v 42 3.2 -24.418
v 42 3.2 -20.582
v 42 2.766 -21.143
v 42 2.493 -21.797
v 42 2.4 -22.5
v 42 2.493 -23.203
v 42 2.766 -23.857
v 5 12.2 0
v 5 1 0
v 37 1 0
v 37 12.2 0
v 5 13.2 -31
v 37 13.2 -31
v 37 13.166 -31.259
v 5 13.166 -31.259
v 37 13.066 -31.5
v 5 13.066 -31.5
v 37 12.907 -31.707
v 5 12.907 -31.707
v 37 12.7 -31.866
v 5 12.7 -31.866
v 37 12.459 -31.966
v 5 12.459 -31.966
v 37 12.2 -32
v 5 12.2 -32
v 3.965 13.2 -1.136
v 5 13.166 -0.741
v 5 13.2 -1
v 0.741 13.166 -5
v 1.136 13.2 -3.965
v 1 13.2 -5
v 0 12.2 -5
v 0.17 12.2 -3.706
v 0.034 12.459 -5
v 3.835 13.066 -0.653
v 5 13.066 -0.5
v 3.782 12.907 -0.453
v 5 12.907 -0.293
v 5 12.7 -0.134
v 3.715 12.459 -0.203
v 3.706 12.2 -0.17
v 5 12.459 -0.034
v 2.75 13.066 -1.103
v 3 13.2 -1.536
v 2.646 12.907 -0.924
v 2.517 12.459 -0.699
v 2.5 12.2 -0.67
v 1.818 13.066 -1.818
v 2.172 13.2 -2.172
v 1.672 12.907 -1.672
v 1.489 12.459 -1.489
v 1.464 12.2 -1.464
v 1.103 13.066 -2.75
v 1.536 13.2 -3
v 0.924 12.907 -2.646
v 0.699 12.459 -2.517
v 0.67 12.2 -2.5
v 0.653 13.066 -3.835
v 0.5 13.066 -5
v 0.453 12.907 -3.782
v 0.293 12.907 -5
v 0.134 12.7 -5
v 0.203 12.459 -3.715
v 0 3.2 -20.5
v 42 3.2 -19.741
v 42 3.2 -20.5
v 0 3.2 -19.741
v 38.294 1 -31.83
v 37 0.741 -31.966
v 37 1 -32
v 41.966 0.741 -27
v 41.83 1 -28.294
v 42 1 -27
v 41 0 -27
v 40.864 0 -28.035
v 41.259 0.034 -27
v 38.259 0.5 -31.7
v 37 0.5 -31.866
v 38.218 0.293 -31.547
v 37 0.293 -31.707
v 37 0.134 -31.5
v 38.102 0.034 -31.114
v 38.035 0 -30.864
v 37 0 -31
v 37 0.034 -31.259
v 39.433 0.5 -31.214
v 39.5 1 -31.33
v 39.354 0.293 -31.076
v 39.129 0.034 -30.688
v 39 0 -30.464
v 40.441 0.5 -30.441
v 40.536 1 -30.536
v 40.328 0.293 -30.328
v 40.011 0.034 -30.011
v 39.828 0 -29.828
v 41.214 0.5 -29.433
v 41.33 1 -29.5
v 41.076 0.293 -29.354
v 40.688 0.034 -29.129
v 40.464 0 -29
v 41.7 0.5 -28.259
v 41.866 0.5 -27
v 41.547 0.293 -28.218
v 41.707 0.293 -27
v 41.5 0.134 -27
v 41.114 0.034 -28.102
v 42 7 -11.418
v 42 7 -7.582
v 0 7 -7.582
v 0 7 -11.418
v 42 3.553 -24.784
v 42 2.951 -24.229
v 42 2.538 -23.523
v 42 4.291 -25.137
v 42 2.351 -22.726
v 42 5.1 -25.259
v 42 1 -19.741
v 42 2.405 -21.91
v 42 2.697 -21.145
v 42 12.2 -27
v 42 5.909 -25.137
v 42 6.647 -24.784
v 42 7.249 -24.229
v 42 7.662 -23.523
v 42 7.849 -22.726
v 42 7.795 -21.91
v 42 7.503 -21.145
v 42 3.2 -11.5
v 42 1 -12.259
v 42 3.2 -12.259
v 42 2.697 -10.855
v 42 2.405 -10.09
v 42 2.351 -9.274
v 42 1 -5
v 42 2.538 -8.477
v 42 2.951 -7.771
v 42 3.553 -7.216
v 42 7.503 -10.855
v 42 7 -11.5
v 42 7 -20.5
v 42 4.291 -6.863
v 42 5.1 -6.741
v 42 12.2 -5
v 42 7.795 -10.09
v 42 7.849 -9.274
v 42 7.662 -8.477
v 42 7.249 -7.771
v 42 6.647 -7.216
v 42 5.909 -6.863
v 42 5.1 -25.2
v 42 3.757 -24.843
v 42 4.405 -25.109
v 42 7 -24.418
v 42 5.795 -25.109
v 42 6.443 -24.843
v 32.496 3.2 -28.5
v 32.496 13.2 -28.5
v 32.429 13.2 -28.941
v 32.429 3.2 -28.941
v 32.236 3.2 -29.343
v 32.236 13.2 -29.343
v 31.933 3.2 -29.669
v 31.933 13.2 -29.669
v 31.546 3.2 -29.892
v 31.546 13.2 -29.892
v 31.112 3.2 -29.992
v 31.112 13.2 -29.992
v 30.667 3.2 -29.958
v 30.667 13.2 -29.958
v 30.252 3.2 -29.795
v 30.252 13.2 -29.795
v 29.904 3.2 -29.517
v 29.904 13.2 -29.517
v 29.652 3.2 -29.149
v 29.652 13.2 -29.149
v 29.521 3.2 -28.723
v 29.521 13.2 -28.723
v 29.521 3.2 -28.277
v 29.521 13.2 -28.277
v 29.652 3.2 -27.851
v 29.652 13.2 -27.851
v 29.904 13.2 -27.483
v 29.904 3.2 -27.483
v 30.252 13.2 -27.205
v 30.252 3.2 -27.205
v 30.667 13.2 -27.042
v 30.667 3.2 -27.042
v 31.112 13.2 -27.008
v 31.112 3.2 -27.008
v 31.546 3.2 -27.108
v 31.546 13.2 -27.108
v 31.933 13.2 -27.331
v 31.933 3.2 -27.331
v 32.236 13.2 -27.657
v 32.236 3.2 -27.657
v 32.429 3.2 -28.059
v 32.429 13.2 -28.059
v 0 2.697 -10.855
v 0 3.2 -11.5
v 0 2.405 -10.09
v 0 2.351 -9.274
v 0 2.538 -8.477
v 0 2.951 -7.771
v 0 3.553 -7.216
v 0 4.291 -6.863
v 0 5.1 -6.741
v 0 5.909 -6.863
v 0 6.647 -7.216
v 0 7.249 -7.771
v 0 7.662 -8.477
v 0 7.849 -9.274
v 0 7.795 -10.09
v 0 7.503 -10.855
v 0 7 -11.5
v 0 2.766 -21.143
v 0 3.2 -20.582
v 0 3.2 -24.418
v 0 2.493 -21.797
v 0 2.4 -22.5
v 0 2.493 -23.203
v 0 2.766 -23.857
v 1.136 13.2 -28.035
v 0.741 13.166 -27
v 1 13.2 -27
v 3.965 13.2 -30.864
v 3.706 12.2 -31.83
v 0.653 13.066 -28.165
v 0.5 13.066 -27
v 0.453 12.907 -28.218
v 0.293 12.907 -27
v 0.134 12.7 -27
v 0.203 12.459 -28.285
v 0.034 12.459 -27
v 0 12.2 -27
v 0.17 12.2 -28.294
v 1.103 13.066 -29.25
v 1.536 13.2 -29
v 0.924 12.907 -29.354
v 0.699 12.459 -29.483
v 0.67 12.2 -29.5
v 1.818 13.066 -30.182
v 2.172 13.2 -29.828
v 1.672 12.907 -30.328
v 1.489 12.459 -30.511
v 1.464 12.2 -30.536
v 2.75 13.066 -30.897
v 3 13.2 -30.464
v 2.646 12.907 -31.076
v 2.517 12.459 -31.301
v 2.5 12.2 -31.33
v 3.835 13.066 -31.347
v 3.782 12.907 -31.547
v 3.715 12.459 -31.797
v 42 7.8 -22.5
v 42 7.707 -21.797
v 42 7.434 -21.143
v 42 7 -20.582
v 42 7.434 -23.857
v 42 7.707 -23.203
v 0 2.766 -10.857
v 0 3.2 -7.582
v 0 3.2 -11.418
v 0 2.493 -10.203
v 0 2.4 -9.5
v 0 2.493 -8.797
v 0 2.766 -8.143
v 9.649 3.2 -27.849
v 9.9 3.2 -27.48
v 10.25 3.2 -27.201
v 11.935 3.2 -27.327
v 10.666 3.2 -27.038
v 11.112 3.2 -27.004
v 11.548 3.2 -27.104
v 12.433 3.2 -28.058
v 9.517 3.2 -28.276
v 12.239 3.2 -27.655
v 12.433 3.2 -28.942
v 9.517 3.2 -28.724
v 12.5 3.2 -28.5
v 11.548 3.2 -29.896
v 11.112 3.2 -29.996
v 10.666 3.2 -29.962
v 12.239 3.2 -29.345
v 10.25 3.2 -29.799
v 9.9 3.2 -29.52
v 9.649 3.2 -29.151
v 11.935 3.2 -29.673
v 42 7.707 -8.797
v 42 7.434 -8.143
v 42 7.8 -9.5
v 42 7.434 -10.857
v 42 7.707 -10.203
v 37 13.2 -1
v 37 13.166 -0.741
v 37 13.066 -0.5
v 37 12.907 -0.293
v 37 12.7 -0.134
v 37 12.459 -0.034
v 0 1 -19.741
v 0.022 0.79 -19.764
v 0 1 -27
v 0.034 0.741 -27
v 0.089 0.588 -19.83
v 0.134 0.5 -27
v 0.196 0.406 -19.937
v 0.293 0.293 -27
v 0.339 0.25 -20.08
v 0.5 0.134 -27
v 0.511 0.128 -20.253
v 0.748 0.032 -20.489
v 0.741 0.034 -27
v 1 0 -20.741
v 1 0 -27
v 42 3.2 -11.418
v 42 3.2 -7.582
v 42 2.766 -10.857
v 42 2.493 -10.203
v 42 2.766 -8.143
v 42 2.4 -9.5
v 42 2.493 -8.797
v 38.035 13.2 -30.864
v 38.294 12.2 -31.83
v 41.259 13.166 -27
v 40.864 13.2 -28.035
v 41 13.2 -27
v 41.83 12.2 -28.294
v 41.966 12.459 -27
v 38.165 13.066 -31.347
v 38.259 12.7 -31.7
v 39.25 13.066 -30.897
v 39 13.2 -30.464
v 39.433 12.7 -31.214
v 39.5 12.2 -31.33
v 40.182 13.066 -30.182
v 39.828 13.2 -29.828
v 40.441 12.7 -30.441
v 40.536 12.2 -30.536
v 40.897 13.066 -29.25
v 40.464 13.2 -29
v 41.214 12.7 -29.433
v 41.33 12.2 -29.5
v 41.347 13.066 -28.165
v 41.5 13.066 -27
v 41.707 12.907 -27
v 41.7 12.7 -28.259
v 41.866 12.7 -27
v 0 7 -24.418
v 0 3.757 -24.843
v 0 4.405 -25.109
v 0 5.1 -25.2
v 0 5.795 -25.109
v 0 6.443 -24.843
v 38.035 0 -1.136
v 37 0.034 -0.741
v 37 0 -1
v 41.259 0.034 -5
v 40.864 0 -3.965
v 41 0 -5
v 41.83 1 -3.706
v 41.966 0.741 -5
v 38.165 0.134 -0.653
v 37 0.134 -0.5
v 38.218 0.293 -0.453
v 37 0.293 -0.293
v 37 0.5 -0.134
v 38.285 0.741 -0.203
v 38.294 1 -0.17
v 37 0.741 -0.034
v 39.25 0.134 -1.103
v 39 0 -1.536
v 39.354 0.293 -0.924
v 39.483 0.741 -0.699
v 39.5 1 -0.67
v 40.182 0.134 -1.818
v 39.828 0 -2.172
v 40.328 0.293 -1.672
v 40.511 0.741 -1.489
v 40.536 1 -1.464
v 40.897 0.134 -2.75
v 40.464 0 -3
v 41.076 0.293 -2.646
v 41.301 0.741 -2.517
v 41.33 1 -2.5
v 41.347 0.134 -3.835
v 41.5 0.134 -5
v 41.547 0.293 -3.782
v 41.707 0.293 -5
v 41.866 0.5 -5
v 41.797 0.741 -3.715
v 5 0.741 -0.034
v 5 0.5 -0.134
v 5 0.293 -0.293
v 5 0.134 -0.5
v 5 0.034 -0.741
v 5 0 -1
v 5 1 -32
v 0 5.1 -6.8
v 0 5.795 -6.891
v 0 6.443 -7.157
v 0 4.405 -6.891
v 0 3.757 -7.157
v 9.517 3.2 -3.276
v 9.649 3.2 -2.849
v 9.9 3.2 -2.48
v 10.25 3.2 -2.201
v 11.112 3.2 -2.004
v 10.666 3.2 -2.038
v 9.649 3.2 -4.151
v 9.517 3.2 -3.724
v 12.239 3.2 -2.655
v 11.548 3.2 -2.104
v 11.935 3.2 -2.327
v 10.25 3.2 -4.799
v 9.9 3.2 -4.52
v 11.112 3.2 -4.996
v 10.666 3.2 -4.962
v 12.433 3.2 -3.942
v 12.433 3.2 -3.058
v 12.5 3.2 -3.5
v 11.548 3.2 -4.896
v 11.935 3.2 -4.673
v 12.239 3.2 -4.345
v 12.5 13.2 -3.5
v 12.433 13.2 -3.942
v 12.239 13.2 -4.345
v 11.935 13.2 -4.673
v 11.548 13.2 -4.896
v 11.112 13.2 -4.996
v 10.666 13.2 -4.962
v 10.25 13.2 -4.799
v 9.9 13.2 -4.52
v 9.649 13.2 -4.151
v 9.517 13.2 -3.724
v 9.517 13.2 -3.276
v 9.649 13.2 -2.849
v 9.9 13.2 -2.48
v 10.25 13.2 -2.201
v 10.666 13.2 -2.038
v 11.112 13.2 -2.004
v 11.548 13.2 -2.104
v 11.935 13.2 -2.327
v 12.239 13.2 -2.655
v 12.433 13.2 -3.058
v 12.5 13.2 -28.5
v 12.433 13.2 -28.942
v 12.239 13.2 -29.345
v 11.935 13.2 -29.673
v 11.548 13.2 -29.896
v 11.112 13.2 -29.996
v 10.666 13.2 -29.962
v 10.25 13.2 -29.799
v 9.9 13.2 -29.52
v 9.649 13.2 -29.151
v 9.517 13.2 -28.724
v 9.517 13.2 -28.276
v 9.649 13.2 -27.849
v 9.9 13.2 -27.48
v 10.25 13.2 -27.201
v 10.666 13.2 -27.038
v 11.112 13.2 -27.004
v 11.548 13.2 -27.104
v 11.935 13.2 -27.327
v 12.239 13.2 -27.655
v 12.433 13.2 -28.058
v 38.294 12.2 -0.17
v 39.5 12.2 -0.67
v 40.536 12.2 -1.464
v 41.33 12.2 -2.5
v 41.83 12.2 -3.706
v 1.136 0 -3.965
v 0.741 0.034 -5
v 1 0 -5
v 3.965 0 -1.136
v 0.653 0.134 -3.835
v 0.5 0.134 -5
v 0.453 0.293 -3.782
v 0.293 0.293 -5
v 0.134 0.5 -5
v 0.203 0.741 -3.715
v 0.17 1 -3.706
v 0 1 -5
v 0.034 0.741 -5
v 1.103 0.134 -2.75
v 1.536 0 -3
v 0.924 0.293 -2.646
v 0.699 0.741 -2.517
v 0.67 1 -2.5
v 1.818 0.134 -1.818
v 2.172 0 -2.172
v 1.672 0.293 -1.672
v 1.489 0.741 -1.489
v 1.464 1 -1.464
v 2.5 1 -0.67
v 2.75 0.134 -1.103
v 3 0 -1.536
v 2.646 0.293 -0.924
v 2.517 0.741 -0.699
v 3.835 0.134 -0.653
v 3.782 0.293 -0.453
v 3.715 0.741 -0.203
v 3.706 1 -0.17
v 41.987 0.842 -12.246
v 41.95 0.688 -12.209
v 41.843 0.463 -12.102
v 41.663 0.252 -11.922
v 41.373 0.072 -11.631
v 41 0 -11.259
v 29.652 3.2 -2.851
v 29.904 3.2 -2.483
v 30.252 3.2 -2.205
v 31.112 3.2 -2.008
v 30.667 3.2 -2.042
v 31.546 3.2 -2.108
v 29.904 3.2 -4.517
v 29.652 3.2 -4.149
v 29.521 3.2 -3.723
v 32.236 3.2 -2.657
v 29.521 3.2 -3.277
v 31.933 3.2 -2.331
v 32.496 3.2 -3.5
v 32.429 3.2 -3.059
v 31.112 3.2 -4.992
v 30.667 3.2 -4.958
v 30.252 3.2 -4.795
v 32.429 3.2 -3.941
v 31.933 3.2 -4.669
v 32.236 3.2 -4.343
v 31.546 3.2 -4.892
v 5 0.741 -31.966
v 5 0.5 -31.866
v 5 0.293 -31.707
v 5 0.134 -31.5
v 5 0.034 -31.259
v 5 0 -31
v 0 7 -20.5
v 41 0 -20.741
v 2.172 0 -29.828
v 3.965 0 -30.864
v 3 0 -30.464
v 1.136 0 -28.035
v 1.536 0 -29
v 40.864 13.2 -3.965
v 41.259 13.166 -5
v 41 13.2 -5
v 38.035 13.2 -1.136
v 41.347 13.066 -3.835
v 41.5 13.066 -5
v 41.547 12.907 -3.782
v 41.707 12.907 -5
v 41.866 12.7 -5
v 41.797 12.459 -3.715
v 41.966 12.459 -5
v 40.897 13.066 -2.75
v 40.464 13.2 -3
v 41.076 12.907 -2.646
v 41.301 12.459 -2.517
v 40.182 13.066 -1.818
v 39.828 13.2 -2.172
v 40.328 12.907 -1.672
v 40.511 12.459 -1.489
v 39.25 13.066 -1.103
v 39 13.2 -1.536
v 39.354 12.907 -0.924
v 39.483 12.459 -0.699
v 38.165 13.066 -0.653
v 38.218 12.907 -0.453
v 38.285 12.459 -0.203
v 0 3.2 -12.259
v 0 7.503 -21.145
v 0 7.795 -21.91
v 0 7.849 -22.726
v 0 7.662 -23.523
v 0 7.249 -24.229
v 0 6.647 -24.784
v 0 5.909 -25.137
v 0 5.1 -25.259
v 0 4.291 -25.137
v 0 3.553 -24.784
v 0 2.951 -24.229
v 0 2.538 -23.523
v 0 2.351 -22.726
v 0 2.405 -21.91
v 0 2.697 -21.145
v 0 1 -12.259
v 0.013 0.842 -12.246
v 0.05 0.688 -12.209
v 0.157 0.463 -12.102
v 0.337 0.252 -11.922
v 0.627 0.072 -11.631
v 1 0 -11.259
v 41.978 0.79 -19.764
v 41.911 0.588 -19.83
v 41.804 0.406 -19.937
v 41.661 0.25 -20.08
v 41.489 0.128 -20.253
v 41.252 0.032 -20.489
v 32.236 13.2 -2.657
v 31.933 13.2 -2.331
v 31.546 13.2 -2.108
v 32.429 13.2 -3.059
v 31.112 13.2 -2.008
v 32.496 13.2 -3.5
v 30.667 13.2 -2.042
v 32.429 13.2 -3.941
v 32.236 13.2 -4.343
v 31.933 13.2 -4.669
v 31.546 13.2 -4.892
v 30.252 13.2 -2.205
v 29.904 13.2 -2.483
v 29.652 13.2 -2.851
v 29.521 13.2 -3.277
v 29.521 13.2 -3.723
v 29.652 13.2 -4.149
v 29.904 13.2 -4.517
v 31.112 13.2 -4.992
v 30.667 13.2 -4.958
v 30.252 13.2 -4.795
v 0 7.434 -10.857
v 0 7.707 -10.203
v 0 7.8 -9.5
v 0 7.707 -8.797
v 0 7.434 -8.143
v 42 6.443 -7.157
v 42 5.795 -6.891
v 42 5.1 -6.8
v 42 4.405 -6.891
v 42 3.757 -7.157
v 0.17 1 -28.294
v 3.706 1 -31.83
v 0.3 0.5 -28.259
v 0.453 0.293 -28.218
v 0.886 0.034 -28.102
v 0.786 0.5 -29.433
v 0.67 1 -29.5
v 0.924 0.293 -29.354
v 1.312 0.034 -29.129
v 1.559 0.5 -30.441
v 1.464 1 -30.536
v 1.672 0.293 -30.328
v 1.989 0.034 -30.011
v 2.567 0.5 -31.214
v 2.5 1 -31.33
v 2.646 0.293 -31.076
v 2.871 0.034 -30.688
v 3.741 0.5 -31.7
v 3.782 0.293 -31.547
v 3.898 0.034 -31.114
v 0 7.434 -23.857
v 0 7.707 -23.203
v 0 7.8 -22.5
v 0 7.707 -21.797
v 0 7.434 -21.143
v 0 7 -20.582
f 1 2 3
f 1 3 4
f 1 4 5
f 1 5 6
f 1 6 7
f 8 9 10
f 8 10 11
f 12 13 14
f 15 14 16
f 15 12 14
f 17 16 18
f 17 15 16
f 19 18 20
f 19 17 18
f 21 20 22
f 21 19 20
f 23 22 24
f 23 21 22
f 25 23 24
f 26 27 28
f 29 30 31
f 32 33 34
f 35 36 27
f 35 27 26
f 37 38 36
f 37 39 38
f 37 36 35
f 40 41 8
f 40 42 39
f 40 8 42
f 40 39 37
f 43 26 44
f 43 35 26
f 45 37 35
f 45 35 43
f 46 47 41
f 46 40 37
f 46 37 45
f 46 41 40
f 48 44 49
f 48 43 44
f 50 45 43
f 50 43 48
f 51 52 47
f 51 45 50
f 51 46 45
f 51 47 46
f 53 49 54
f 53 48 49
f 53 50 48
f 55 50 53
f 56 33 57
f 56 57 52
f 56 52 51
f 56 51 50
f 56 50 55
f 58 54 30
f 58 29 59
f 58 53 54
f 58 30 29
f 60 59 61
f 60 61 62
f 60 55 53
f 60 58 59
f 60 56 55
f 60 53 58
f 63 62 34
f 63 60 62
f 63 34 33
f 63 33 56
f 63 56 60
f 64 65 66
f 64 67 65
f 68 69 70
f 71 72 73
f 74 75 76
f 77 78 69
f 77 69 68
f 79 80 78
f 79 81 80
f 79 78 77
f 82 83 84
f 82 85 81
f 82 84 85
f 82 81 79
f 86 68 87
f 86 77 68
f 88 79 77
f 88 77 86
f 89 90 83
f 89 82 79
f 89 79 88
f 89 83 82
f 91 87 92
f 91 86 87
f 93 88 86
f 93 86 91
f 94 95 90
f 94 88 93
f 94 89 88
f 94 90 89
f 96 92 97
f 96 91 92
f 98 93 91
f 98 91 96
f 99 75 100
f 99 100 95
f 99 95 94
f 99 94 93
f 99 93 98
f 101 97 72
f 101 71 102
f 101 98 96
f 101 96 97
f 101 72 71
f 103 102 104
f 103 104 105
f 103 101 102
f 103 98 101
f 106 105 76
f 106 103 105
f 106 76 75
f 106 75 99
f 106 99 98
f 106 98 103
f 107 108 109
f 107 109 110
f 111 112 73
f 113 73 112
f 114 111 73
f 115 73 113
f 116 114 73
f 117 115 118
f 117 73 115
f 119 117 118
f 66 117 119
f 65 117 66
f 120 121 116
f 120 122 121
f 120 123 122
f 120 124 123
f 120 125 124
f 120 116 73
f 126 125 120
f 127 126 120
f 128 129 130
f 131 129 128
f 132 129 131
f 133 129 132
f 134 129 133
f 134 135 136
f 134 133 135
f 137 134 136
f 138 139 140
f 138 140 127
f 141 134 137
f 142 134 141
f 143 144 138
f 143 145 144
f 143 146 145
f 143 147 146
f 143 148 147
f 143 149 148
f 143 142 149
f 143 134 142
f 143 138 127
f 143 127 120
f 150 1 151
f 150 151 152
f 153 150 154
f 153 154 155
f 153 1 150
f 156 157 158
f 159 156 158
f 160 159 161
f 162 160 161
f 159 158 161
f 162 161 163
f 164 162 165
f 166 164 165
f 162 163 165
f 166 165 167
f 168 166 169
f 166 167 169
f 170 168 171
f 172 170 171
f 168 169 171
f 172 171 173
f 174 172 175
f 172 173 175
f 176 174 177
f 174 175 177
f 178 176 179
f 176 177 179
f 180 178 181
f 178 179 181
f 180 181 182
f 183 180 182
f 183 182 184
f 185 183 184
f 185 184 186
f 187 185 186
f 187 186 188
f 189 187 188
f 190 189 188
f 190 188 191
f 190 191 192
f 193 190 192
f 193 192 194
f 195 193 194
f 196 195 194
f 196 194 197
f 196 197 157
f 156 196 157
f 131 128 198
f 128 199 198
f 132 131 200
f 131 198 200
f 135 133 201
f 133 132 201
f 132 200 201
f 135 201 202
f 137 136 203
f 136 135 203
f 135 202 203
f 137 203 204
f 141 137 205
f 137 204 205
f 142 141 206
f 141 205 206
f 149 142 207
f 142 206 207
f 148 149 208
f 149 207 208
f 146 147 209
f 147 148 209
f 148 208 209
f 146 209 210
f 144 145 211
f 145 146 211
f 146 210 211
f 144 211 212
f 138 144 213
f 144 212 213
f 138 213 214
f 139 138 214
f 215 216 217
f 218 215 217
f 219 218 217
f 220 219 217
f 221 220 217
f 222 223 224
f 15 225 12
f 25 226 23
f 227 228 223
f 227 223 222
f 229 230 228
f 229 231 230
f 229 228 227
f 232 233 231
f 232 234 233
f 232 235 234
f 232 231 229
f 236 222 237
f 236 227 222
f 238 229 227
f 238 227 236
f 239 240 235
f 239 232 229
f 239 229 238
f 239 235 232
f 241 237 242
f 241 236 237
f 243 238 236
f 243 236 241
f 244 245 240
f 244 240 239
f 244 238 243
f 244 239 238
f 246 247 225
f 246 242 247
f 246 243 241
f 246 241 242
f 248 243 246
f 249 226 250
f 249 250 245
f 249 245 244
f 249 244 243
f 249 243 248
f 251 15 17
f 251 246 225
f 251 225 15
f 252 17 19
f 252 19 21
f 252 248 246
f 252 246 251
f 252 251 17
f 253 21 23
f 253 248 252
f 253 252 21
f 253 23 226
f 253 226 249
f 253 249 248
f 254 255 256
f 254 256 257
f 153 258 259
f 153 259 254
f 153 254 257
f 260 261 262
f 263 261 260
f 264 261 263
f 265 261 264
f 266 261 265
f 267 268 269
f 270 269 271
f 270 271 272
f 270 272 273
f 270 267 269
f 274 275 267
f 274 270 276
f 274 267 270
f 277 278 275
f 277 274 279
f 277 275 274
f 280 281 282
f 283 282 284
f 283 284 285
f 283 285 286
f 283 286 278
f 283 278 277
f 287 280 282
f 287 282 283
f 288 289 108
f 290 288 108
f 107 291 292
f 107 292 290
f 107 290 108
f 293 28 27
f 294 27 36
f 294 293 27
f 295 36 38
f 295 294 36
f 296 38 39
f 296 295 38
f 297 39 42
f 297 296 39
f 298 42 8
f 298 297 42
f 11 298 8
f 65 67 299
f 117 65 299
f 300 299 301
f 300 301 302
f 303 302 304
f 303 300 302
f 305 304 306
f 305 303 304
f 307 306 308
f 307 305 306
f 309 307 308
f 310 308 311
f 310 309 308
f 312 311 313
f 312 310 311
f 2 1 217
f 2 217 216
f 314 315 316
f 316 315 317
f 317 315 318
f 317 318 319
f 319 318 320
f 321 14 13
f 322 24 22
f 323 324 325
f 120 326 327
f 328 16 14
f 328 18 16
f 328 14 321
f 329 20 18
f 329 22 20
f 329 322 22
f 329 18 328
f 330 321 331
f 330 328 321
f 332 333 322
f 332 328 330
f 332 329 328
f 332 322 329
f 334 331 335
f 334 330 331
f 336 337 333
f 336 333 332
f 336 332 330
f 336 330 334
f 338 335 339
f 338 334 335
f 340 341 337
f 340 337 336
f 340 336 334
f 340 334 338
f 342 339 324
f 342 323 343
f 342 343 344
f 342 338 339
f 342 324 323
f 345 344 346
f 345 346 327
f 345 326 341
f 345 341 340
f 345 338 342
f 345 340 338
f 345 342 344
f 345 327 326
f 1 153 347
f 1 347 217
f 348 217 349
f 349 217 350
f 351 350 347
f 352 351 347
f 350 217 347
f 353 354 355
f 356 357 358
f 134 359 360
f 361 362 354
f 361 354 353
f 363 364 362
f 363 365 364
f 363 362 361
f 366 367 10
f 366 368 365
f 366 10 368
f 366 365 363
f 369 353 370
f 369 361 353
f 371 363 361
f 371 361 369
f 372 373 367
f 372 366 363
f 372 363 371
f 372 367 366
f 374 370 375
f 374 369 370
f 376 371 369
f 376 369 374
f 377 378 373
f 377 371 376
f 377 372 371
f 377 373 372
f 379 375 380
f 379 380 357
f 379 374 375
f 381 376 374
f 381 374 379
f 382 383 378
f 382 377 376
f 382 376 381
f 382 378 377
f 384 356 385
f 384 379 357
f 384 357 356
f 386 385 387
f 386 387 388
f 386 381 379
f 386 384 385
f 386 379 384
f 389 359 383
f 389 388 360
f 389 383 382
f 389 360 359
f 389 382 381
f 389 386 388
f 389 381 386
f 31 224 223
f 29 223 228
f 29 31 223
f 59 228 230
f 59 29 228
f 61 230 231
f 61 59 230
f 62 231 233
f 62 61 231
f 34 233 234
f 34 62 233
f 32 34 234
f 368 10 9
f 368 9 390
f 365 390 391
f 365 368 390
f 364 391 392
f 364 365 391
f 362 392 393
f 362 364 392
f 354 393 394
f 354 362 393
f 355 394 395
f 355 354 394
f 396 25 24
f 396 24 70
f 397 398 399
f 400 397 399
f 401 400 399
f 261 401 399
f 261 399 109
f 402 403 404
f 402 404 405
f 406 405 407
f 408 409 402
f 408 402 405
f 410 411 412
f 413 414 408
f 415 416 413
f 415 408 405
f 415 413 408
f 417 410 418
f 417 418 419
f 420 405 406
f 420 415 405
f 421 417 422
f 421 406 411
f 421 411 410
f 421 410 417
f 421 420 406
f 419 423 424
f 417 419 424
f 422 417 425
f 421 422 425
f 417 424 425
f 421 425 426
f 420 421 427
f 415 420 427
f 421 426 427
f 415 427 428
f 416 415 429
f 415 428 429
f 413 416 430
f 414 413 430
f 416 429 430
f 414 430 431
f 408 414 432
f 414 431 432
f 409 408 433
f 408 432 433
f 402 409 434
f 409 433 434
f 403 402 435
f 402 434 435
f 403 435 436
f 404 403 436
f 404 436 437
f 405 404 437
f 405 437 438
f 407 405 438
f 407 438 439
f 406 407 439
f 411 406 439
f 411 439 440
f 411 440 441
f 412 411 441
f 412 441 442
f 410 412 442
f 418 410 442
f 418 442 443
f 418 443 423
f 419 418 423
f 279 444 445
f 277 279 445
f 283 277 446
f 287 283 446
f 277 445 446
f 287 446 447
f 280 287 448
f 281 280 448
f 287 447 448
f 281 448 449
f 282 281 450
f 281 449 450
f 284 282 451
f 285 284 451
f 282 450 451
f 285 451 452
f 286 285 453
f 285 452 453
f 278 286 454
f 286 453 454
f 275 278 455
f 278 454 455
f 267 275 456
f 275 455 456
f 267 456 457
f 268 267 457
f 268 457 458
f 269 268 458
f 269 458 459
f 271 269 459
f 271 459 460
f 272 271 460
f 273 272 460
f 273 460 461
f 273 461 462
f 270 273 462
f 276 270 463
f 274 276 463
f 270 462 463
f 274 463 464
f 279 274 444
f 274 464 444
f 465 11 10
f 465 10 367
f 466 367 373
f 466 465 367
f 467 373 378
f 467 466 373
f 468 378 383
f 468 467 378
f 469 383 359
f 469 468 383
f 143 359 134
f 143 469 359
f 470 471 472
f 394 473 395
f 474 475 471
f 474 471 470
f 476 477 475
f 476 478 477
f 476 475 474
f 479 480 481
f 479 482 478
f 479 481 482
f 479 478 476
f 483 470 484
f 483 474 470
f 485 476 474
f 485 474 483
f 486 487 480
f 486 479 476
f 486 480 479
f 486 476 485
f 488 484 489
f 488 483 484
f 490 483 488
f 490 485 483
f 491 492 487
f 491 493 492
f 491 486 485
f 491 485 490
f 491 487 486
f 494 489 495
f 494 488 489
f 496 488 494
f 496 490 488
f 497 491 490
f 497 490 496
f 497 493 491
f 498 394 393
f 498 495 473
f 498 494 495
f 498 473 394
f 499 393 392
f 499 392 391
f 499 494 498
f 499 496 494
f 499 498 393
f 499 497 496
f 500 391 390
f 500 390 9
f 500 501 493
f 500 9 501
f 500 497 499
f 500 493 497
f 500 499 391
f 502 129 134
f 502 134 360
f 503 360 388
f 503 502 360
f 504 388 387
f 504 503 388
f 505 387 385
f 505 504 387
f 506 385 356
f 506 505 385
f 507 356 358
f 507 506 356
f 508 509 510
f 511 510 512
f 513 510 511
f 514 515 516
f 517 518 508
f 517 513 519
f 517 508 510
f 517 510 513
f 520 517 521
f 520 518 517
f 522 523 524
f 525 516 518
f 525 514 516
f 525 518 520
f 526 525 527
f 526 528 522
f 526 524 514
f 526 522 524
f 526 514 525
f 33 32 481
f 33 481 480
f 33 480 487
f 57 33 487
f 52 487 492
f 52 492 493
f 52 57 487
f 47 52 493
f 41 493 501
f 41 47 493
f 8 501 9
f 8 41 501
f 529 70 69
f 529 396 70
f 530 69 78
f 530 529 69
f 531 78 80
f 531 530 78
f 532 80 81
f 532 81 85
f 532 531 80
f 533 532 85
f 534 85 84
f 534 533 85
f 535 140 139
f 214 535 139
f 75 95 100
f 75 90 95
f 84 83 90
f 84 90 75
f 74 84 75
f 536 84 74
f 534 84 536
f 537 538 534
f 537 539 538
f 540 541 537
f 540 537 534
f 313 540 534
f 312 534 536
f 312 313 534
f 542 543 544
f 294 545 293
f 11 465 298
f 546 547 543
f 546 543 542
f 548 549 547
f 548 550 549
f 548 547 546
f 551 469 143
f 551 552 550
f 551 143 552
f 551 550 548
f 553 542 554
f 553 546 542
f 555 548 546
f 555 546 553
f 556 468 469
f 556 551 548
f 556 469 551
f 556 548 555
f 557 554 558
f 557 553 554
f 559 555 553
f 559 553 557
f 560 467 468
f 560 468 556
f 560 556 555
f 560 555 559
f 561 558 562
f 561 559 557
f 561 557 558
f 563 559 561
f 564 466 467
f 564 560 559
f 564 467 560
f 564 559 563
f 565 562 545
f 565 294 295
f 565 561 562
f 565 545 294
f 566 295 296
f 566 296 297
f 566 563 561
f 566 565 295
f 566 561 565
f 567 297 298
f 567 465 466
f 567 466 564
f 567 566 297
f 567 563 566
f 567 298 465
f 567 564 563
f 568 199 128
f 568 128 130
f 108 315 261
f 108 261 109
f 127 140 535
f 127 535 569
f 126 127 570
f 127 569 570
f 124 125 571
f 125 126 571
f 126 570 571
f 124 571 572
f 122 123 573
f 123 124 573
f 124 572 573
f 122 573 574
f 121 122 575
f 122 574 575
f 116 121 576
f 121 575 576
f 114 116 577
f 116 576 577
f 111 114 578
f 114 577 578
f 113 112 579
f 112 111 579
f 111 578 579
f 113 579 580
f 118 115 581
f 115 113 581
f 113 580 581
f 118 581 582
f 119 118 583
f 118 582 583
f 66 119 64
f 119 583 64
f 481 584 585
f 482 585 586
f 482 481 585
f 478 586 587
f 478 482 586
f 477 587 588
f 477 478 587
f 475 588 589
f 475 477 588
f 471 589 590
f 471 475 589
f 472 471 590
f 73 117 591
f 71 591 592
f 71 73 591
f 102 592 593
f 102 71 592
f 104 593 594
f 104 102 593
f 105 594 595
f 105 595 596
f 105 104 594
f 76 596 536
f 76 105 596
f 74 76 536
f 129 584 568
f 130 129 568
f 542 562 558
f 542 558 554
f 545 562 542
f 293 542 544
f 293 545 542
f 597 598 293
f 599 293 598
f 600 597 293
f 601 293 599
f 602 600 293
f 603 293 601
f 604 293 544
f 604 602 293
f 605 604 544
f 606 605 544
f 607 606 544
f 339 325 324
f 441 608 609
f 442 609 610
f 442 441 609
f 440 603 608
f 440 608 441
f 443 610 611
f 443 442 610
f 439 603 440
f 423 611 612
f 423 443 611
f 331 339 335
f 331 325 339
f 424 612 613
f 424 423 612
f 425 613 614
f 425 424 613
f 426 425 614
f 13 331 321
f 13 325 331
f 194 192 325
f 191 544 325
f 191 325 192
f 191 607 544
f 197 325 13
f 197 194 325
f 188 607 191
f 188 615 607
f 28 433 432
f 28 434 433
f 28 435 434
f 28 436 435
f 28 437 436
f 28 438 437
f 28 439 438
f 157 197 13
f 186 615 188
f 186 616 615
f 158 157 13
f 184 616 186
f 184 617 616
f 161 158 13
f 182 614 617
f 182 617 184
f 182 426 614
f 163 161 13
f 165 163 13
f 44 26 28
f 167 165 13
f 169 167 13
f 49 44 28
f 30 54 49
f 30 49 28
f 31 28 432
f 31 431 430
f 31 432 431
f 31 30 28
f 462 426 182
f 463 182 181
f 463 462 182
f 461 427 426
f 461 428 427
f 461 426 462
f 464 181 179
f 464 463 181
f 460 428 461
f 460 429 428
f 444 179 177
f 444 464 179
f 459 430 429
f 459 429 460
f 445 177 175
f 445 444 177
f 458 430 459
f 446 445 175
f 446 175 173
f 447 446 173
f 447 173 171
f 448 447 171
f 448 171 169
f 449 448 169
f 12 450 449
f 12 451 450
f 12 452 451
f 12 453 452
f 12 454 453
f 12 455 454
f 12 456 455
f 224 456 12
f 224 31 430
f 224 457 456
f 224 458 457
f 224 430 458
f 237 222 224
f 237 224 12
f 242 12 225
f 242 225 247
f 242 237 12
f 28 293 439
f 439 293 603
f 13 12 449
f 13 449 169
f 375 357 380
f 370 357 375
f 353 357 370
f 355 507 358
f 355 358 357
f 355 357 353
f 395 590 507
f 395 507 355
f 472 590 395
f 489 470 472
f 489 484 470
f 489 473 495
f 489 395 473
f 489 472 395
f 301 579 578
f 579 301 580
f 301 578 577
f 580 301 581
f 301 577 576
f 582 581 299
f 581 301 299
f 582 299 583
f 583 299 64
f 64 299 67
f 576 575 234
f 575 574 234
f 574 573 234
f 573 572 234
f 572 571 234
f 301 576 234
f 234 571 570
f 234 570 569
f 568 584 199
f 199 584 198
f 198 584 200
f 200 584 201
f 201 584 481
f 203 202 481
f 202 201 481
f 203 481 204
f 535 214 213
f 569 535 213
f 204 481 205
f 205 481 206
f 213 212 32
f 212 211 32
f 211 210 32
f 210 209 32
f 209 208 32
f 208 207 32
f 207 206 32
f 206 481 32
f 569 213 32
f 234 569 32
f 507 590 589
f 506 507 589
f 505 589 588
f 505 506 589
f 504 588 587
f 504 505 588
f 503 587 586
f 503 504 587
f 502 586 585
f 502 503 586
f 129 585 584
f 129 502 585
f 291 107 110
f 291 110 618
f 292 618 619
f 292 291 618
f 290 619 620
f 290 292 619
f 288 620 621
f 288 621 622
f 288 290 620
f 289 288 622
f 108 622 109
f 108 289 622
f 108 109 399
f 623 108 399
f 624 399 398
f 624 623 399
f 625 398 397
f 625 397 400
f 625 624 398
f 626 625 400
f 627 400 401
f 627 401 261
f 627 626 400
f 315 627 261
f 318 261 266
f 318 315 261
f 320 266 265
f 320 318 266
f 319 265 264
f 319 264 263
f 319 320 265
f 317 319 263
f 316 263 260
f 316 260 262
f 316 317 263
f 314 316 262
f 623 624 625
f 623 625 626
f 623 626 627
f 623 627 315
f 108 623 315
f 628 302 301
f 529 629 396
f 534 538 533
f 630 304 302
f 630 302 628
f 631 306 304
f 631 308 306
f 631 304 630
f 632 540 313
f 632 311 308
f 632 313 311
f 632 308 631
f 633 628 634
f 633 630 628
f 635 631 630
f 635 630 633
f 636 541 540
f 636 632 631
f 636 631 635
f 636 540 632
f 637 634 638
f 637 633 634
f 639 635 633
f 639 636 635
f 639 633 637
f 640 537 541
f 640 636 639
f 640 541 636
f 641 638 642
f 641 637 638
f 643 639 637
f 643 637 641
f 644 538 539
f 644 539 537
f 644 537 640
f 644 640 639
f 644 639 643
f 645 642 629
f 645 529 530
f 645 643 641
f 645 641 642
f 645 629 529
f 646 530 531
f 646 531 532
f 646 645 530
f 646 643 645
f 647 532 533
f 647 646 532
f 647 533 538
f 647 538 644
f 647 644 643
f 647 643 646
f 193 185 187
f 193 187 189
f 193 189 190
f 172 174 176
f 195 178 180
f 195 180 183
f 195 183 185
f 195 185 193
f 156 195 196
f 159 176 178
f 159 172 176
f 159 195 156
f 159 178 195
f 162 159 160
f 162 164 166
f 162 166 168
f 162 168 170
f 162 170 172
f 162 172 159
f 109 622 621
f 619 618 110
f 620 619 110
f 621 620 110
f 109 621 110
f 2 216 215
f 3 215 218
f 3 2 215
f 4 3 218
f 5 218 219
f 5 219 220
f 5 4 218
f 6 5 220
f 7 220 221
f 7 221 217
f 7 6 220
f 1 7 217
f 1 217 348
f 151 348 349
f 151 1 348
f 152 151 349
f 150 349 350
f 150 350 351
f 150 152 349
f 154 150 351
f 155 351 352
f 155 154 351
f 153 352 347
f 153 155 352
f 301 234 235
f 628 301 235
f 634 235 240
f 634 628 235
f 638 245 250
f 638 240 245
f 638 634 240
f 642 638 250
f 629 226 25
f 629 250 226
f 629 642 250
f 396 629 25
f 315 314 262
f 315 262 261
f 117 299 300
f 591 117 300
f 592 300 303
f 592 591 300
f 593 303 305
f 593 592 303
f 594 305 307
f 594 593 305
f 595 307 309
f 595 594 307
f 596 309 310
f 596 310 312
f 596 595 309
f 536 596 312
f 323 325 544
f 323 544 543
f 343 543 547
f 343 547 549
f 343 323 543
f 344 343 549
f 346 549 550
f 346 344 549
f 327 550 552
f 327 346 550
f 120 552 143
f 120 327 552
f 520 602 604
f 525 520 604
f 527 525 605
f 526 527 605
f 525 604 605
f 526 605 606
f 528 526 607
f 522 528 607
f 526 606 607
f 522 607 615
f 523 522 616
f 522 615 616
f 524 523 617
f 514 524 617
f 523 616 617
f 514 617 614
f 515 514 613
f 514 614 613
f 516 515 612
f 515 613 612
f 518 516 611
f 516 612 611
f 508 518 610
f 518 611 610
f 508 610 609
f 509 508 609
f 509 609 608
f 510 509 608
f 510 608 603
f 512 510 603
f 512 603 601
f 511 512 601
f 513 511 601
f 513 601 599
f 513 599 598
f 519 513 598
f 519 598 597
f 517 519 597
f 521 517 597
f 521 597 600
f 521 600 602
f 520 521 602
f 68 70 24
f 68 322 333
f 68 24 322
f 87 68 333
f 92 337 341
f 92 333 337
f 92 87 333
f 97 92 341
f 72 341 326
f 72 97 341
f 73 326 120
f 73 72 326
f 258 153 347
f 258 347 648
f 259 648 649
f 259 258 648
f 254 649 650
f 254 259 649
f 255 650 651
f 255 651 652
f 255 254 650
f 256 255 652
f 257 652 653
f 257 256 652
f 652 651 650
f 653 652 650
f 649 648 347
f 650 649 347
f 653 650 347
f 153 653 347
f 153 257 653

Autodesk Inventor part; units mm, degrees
ref_plane "YZ Plane" through (0, 0, 0) normal (1, 0, 0) x (0, 1, 0)
ref_plane "XZ Plane" through (0, 0, 0) normal (0, 1, 0) x (-1, 0, 0)
ref_plane "XY Plane" through (0, 0, 0) normal (0, 0, 1) x (1, 0, 0)
sketch "Sketch1" plane through (0, 0, 0) normal (1, 0, 0) x (0, 1, 0)
  line L0 (0, 0) -> (13.2, 0)
  line L1 (13.2, 0) -> (13.2, -32)
  line L2 (13.2, -32) -> (0, -32)
  line L3 (0, -32) -> (0, -19.7414)
  arc A0 (7, -11.5) -> (3.2, -11.5) centre (5.1, -9.5) ccw
  arc A1 (3.2, -20.5) -> (7, -20.5) centre (5.1, -22.5) ccw
  line L4 (3.2, -11.5) -> (3.2, -12.2586)
  line L5 (0, -12.2586) -> (0, 0)
  line L6 (7, -20.5) -> (7, -11.5)
  line L7 (3.2, -19.7414) -> (3.2, -20.5)
  line L8 (3.2, -19.7414) -> (0, -19.7414)
  line L9 (0, -12.2586) -> (3.2, -12.2586)
  dimension "d0" = 32
  dimension "d1" = 13.2
  dimension "d9" = 9.5
  dimension "d10" = 9.5
  dimension "d11" = 2.7586
  dimension "d12" = 2.7586
  dimension "d13" = 7
  dimension "d14" = 3.2
  dimension "d15" = 5.1
  dimension "d16" = 5.1
  dimension "d17" = 0.7586
  dimension "d18" = 0.7586
  dimension "d19" = 9
  dimension "d20" = 3.2
extrude "Extrusion1" add sketch "Sketch1" along normal blind 42
sketch "Sketch2" plane through (0, 13.2, 0) normal (0, 1, 0) x (1, 0, 0)
  circle A0 centre (11, 3.5) radius 1.5
  circle A1 centre (31, 3.5) radius 1.4957
  line L0 (-3.7091, 16) -> (49.3641, 16) construction
  line L1 (0, 0) -> (42, 0) projected
  circle A2 centre (11, 28.5) radius 1.5
  circle A3 centre (31, 28.5) radius 1.4957
  line L2 (0, 32) -> (0, 0) projected
  dimension "d23" = 16
  dimension "d24" = 3
  dimension "d25" = 20
  dimension "d26" = 11
  dimension "d27" = 3.5
  dimension "d28" = 3.5
extrude "Extrusion2" cut sketch "Sketch2" against normal blind 10
sketch "Sketch3" plane through (42, 0, 0) normal (1, 0, 0) x (0, 0, -1)
  arc A0 (11.5, 7) -> (7.5817, 7.0824) centre (9.5, 5.1) ccw
  arc A1 (20.5, 3.2) -> (24.5, 3.2) centre (22.5, 5.1) ccw
  arc A2 (11.5, 7) -> (11.5, 3.2) centre (9.5, 5.1) ccw projected
  arc A3 (20.5, 3.2) -> (20.5, 7) centre (22.5, 5.1) ccw projected
  line L0 (11.5, 7) -> (20.5, 7) projected
  line L1 (11.5, 7) -> (20.5, 7)
  line L2 (7.5817, 7) -> (24.4183, 7)
  line L3 (24.4183, 7) -> (24.4183, 3.2)
  line L4 (24.4183, 3.2) -> (20.5, 3.2)
  line L5 (7.5817, 3.2) -> (7.5817, 7)
  arc A4 (7.5, 3.2) -> (11.5, 3.2) centre (9.5, 5.1) ccw
  arc A5 (7.5817, 7.0824) -> (7.5, 7) centre (9.5, 5.1) ccw
  arc A6 (7.5, 7) -> (7.5, 3.2) centre (9.5, 5.1) ccw
  arc A7 (24.5, 7) -> (24.4183, 7.0824) centre (22.5, 5.1) ccw
  arc A8 (24.5, 3.2) -> (24.5, 7) centre (22.5, 5.1) ccw
  arc A9 (24.4183, 7.0824) -> (20.5, 7) centre (22.5, 5.1) ccw
  line L6 (11.5, 3.2) -> (7.5817, 3.2)
  arc A10 (20.5817, 3.2) -> (20.5817, 7) centre (22.5, 5.1) ccw
  arc A11 (11.4183, 7) -> (11.4183, 3.2) centre (9.5, 5.1) ccw
  point P0 (0, 0)
  dimension "d31" = 3.8
  dimension "d32" = 5.4
  dimension "d33" = 5.4
extrude "Extrusion3" add sketch "Sketch3" against normal up to surface (42 mm away) contours L2 A11 | A10 L2 | L5 A11 | A10 L3 | L6 A11 | A10 L4
fillet "Fillet1" radius 5 4 edges at (0, 6.6, 0) (0, 6.6, -32) (42, 6.6, 0) (42, 6.6, -32)
fillet "Fillet2" radius 1 20 edges at (40.5355, 13.2, -30.5355) (42, 13.2, -16) (40.5355, 13.2, -1.4645) (21, 13.2, 0) (1.4645, 13.2, -1.4645) (0, 13.2, -16) (1.4645, 13.2, -30.5355) (21, 13.2, -32) (40.5355, 0, -30.5355) (42, 0, -23.3707) (1.4645, 0, -30.5355) (0, 0, -23.3707) (21, 0, -32) (40.5355, 0, -1.4645) (42, 0, -8.6293) (1.4645, 0, -1.4645) (0, 0, -8.6293) (21, 0, 0) (21, 0, -12.2586) (21, 0, -19.7414)
thread "Thread1" size "M3x0.5" class "6H" standard "ISO Metric profile" full length
thread "Thread2" size "M3x0.5" class "6H" standard "ISO Metric profile" full length
thread "Thread3" size "M3x0.5" class "6H" standard "ISO Metric profile" full length
thread "Thread4" size "M3x0.5" class "6H" standard "ISO Metric profile" full length
properties part number "Fuehrungslager"
